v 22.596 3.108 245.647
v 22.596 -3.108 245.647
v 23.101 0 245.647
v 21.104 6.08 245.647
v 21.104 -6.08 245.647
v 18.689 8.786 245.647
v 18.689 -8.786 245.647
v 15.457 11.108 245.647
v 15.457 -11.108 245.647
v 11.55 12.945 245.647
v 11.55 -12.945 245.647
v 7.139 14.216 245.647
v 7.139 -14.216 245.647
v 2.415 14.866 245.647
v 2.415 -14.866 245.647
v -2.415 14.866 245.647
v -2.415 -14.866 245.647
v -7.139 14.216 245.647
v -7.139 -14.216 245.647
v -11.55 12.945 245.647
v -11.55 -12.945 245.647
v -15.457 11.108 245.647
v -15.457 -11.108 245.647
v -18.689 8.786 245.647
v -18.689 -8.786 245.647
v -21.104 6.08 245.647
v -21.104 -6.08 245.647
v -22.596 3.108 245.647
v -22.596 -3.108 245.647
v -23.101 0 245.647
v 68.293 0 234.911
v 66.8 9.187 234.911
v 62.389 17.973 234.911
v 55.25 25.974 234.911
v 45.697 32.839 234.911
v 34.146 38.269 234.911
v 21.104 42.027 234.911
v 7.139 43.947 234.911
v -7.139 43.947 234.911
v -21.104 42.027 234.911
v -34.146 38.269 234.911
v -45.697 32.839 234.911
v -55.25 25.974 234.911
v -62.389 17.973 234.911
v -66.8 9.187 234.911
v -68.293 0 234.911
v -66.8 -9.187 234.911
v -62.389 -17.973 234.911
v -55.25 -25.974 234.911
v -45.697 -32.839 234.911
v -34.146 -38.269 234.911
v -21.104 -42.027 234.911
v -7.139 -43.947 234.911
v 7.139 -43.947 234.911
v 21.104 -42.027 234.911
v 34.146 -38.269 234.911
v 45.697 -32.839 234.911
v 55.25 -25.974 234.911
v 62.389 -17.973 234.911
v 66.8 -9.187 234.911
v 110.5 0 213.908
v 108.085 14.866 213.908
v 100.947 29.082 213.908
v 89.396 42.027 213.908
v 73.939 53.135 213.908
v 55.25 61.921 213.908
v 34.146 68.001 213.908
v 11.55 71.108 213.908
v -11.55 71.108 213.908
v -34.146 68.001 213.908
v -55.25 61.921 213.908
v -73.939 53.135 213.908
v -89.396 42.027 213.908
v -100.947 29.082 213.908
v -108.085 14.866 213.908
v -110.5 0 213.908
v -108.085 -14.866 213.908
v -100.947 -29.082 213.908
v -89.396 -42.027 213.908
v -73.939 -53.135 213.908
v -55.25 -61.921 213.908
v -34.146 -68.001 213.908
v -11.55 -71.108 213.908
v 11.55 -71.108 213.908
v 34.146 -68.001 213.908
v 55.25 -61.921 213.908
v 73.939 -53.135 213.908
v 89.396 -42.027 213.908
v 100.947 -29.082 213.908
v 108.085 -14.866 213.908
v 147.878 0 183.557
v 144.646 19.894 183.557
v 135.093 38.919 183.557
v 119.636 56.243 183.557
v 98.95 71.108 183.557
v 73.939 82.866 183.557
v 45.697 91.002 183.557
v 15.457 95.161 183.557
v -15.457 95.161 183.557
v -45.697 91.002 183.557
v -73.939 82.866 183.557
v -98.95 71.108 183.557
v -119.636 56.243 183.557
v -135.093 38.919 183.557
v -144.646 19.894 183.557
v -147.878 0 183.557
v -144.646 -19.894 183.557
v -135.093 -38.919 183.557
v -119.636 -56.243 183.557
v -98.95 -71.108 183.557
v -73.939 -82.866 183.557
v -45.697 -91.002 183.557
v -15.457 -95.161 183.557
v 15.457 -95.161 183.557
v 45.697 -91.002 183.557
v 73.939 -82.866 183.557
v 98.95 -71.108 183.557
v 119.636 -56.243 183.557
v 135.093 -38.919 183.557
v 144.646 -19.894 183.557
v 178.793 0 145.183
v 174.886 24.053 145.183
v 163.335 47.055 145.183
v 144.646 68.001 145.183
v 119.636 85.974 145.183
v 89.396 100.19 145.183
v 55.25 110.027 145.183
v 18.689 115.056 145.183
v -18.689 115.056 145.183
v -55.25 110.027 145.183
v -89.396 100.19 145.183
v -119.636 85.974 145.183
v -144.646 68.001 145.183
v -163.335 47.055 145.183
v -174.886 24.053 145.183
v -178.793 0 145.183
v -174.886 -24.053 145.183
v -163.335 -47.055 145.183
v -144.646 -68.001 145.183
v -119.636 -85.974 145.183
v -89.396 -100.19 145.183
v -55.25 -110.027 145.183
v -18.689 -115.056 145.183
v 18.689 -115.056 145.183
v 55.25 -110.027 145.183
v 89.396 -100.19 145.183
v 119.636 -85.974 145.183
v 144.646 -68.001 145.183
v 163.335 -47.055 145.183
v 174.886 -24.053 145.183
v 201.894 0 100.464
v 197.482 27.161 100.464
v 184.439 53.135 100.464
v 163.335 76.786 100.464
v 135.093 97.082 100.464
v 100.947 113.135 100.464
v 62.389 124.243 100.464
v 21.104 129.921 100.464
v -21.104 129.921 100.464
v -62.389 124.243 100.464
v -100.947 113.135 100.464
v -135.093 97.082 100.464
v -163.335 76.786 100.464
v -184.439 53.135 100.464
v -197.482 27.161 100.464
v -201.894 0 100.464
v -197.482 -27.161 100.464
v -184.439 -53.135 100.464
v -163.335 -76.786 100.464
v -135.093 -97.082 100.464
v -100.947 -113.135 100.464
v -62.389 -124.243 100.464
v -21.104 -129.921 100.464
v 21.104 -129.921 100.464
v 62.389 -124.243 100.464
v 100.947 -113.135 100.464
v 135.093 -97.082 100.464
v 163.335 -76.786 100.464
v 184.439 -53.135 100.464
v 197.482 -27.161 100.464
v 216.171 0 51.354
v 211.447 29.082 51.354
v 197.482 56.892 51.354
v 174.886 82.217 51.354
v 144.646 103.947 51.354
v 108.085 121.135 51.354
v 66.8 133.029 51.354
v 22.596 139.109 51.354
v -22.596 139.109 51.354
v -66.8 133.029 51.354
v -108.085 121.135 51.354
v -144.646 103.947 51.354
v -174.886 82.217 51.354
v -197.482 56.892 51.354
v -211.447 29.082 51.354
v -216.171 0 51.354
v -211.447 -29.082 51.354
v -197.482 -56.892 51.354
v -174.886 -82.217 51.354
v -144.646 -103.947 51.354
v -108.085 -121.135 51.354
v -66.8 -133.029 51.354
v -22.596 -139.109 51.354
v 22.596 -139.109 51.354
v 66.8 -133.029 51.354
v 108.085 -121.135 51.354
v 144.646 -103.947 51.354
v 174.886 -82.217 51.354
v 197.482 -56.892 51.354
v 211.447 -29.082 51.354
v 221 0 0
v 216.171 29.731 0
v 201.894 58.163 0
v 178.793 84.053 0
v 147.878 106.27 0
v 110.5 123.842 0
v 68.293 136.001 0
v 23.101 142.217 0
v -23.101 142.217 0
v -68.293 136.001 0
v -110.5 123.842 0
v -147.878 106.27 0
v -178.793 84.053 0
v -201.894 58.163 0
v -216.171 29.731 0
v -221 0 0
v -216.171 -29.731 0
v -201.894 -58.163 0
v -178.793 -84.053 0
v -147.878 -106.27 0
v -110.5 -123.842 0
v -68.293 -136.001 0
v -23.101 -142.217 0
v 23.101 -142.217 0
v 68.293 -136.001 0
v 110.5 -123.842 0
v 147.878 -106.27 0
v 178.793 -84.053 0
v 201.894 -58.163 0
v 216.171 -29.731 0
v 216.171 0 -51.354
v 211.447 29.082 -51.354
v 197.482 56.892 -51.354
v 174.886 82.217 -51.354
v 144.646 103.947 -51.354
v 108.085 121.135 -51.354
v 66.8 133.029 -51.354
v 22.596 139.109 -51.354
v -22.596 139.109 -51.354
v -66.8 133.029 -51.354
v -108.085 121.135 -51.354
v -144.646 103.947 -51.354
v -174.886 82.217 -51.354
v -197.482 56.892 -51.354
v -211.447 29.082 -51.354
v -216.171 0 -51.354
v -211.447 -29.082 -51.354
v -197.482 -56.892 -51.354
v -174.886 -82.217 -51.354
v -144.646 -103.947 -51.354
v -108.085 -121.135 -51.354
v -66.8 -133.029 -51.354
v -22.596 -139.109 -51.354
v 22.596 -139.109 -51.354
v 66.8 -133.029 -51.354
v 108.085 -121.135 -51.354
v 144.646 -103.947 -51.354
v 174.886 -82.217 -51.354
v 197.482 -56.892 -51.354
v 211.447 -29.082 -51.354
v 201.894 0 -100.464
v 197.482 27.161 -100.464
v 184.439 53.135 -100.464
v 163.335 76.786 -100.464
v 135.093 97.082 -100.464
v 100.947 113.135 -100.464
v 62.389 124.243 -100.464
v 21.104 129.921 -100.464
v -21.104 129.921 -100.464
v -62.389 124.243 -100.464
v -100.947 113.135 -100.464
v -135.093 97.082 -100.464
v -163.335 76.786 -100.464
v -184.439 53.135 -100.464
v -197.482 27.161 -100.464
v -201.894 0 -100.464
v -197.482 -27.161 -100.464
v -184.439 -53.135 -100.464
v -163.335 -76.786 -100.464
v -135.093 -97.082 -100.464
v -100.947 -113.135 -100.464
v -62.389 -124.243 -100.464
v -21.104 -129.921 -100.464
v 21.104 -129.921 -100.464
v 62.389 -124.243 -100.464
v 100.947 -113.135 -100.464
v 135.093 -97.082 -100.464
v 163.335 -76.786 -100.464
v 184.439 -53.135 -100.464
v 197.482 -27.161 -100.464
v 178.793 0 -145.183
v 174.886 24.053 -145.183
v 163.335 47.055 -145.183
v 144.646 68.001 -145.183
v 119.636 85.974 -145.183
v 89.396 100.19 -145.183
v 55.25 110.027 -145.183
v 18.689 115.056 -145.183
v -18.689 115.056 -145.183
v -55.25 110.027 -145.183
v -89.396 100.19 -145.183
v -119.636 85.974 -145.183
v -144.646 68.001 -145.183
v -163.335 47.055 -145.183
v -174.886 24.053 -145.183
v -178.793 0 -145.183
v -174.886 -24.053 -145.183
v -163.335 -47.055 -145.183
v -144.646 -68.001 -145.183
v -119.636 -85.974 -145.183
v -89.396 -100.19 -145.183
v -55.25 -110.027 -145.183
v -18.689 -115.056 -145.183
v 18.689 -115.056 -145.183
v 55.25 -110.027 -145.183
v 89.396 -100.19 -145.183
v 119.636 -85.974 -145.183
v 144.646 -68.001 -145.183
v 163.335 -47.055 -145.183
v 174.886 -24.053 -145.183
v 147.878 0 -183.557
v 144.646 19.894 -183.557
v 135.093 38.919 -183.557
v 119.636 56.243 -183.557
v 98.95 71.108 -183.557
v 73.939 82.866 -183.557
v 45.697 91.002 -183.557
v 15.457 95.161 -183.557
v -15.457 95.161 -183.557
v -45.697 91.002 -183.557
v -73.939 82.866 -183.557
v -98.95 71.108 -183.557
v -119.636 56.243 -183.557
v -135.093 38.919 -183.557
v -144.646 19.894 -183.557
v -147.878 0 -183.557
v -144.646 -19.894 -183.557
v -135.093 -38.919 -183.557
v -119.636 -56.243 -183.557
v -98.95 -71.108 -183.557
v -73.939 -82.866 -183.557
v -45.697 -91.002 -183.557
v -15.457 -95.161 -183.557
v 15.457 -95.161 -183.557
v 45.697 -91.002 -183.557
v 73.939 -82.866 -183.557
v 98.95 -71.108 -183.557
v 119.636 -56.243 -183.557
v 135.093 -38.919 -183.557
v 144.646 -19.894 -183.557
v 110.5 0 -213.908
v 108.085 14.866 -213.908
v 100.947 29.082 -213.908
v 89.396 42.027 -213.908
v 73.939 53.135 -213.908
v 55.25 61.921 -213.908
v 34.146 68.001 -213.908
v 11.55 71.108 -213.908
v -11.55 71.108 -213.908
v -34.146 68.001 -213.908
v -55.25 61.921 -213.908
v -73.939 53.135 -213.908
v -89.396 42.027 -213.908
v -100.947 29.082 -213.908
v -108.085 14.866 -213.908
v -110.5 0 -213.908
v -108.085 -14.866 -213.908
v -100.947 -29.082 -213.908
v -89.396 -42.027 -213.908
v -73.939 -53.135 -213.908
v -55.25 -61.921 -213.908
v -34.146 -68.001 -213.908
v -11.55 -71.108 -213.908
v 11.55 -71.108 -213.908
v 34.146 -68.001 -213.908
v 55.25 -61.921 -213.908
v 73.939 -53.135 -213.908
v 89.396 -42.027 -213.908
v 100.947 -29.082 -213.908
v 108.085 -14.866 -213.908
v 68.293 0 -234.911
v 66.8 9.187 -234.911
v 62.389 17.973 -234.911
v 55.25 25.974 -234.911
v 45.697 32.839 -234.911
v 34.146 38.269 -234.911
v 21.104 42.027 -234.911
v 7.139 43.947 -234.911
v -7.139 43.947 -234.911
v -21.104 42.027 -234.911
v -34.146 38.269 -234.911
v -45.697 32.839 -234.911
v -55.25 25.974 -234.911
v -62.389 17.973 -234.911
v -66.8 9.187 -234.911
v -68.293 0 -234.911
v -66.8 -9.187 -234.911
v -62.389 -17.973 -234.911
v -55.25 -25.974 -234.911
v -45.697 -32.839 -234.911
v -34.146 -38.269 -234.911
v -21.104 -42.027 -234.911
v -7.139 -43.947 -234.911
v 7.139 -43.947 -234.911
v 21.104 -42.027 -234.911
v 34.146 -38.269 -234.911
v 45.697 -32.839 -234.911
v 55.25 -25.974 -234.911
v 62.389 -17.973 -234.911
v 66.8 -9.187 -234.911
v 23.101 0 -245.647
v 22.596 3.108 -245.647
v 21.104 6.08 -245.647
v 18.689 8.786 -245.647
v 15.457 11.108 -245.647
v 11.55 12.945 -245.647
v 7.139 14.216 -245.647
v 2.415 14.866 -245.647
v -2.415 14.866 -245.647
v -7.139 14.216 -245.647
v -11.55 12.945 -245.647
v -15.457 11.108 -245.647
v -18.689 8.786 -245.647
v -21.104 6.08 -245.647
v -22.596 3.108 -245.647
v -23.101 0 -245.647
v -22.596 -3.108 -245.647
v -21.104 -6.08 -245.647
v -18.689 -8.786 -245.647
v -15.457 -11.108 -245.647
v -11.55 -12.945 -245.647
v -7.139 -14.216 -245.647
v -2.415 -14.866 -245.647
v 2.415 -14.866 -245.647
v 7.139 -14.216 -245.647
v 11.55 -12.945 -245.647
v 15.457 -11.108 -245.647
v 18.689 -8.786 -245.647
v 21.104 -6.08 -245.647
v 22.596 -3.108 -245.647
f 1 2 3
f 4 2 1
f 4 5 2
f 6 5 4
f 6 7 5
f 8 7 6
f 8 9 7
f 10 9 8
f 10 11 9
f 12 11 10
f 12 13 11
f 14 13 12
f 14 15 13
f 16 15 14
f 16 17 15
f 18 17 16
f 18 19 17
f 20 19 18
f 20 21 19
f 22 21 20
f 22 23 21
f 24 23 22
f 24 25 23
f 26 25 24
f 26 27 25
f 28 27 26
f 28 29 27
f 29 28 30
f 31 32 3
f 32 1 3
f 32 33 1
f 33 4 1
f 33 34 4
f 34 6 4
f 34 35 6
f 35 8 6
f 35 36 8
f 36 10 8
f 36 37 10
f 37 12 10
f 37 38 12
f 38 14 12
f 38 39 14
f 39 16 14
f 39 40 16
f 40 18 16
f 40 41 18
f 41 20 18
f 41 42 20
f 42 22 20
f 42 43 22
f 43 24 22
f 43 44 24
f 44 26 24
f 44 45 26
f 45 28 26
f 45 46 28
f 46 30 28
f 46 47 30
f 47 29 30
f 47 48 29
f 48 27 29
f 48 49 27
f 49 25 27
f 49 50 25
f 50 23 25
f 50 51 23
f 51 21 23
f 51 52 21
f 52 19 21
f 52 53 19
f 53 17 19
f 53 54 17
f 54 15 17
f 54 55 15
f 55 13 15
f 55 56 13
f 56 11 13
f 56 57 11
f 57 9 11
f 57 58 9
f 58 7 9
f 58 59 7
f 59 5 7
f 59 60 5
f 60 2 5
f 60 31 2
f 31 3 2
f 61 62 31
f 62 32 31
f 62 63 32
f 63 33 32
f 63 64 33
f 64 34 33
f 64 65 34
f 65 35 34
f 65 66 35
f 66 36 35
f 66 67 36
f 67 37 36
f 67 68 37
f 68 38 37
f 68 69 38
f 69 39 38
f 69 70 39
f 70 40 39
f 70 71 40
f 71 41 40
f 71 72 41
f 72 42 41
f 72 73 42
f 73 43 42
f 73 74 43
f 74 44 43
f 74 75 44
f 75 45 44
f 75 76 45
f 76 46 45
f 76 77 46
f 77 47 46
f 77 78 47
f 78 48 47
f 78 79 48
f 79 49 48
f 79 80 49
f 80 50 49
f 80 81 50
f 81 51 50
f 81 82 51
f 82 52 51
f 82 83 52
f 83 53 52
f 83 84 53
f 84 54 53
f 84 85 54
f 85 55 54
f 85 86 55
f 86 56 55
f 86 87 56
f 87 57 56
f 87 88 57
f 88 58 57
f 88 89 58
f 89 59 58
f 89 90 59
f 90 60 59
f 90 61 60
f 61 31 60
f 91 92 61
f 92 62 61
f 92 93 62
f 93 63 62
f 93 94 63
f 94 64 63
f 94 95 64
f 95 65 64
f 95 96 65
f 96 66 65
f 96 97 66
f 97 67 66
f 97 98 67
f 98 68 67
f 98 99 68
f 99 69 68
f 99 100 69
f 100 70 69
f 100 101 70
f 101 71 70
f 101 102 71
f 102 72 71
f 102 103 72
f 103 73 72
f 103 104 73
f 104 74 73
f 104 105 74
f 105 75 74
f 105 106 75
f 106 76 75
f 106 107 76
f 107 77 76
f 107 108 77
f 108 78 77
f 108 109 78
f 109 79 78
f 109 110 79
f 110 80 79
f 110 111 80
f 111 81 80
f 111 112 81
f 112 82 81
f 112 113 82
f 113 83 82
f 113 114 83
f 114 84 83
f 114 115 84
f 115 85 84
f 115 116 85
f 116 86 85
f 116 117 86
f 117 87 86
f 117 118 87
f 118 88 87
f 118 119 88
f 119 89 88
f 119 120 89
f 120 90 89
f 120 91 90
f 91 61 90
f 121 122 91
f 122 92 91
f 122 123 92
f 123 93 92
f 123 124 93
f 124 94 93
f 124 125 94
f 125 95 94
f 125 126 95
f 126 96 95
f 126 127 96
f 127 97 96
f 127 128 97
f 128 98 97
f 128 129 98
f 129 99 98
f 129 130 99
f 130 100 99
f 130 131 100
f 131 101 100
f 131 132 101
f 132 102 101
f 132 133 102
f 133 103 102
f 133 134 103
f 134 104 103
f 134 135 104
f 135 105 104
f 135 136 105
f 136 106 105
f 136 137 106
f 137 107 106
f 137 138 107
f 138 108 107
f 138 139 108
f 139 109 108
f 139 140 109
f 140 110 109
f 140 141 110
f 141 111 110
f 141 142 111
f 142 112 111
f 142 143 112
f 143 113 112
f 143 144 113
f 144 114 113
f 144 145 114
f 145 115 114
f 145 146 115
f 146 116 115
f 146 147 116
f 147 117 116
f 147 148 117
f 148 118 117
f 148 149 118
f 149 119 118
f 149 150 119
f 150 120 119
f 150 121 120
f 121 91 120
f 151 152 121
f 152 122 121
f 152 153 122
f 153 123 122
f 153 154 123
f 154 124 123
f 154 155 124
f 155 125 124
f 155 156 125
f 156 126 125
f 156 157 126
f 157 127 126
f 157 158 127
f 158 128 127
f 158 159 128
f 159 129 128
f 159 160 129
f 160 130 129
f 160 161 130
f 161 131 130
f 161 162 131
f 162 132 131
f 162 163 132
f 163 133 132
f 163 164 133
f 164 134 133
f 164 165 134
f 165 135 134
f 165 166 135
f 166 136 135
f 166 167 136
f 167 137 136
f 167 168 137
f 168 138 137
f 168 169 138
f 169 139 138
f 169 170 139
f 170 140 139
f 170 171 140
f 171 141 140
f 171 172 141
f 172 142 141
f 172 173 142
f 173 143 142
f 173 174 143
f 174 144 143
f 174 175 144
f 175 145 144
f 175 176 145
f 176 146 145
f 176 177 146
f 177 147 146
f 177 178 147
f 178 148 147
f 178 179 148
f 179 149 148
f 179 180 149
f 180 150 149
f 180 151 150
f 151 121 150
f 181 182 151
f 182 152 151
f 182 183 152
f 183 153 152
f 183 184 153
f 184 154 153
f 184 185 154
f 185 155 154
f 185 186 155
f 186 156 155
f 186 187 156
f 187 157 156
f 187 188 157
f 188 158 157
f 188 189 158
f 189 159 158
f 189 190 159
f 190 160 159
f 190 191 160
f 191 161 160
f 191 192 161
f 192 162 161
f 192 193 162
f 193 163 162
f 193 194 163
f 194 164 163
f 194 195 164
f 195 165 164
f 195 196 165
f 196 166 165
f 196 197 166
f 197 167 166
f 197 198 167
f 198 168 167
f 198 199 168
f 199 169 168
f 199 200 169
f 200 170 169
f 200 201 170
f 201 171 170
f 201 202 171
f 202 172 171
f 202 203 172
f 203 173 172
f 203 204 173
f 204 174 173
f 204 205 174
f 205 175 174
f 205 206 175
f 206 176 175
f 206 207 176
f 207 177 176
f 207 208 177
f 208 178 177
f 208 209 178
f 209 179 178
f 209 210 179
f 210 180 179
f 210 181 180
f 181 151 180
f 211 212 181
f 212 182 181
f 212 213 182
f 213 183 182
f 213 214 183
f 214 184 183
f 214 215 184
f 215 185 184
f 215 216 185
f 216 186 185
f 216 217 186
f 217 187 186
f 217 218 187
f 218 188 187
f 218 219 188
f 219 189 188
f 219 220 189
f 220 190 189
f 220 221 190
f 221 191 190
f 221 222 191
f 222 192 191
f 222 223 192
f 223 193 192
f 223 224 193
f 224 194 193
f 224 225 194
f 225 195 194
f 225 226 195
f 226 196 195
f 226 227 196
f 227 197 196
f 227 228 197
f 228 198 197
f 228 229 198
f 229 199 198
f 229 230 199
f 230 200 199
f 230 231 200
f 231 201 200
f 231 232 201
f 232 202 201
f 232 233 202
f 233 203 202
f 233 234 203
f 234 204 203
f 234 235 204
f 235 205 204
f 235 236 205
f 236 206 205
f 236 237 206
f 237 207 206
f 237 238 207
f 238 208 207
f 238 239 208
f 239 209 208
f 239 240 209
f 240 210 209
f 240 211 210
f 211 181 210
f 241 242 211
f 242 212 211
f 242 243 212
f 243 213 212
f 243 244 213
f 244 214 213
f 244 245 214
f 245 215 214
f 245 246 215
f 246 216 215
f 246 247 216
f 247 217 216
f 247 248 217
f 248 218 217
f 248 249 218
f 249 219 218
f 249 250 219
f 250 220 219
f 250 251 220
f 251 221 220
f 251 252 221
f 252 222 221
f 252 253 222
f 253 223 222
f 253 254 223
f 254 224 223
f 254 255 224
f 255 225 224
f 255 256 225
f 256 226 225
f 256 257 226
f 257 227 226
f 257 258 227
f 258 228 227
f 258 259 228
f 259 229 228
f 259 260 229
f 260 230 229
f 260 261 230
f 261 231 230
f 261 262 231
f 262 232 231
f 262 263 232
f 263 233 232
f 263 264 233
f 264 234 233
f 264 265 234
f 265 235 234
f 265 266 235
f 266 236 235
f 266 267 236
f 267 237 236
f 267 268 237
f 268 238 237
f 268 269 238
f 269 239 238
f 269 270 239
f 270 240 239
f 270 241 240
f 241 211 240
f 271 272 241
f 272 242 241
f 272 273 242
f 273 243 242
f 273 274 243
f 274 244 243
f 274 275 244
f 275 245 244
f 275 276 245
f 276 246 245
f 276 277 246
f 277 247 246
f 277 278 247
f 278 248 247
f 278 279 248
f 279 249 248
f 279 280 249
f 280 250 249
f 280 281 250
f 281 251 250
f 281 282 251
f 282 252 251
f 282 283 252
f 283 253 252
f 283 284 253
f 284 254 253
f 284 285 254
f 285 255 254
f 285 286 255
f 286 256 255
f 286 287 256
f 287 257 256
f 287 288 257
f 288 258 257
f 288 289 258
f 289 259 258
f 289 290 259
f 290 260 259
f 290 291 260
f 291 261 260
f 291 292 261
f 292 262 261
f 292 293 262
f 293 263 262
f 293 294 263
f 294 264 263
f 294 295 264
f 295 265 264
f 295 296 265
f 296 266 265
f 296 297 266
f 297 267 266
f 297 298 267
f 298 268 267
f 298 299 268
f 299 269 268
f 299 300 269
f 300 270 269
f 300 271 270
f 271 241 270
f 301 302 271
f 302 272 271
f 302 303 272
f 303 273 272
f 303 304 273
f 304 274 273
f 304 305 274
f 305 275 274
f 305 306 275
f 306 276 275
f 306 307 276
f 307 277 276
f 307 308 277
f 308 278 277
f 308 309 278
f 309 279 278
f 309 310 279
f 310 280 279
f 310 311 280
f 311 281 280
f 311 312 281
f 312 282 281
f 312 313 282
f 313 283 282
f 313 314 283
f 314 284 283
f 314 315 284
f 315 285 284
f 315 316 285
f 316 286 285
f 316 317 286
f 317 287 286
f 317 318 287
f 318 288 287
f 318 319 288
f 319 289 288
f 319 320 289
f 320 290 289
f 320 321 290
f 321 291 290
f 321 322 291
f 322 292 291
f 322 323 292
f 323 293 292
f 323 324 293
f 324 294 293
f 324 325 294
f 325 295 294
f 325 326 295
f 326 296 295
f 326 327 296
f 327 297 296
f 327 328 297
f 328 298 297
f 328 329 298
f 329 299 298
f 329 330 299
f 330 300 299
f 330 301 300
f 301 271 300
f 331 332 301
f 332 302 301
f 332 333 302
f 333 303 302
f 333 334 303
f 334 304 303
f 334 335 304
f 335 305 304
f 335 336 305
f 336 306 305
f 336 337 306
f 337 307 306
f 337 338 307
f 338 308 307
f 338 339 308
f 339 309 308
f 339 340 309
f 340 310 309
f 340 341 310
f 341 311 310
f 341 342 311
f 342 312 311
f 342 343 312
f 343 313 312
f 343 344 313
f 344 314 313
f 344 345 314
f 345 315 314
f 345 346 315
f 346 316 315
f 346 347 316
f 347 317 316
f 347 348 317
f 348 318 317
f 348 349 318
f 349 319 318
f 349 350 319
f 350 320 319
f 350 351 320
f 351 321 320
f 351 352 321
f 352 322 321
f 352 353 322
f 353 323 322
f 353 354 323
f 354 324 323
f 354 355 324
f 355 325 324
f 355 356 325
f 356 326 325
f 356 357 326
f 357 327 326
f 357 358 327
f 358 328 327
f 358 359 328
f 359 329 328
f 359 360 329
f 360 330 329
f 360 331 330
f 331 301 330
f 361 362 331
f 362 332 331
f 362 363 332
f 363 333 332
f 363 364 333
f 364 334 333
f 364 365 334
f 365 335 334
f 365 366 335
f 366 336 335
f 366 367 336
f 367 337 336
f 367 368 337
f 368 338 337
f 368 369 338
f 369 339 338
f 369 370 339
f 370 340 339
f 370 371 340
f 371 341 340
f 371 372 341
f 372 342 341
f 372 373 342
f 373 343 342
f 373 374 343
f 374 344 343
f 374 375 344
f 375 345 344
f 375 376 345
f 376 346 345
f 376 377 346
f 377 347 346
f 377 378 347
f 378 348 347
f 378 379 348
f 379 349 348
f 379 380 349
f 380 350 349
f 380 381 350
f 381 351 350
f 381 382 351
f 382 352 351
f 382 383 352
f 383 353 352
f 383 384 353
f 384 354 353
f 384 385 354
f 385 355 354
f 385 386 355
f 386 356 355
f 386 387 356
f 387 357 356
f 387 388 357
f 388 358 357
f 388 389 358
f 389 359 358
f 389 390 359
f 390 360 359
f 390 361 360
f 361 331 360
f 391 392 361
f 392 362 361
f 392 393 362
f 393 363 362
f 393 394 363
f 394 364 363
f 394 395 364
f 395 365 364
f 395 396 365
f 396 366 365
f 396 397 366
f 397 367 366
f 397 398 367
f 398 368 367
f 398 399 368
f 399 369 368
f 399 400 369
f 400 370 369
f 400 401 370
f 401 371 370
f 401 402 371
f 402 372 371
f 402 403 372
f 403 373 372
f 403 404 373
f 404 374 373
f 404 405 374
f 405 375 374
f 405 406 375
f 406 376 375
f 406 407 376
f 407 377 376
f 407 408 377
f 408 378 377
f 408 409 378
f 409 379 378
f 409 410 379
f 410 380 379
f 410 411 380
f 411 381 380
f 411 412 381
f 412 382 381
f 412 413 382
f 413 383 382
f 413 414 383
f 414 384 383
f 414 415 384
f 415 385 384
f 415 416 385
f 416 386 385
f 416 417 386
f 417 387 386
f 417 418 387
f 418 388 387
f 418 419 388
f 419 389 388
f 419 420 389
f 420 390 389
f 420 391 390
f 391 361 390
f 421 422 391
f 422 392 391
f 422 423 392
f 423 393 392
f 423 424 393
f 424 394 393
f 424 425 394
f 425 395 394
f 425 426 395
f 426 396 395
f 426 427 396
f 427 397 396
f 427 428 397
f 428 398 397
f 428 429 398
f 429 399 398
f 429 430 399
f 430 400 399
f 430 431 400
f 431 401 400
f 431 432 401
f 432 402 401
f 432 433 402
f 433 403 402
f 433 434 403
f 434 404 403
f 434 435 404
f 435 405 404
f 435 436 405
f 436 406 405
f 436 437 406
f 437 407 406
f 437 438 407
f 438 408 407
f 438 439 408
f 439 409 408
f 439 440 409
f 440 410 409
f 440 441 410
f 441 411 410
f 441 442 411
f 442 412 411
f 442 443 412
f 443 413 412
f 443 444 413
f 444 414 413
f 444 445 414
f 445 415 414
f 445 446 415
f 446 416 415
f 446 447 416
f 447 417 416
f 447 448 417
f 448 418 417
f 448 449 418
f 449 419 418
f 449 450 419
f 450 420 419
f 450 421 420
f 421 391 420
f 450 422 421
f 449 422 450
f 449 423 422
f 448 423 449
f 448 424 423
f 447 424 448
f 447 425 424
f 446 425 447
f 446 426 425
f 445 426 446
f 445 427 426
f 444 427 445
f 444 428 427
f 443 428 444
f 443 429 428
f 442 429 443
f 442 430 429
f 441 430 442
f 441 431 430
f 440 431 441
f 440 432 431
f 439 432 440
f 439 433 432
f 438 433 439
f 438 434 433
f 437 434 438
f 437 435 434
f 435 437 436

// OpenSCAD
// Generated by SolidPython 1.0.1 on 2020-07-29 00:46:53


scale(v = [17, 11, 19]) {
	sphere(r = 13);
}
/***********************************************
*********      SolidPython code:      **********
************************************************
 
# import packages: SolidPython
from solid import *
from solid.utils import *
from itertools import chain, combinations, permutations


class Resize:

    def __init__(self, scad_file):
        self.scad_file = scad_file
        #self.scad_file = import_scad(scad_file)
        # cone/cylinder param:
        self.r1 = 0
        self.r2 = 0
        self.h = 0
        # rectangular prism param:
        self.w = 0
        self.l = 0
        # ellipse param:
        self.r = 0

    # import OpenScad code (file name corresponds to shape)


    # classify shape + parameters
    def assign(self, param1, param2, param3):
        if self.scad_file == 'cone.scad':
            self.r1 = param1
            self.r2 = param2
            self.h = param3
        elif self.scad_file == 'cylinder.scad':
            self.r1 = param1
            self.r2 = param2
            self.h = param3
        elif self.scad_file == 'rectangularPrism.scad':
            self.h = param1
            self.l = param2
            self.w = param3
        else:
            self.r = param1
            self.h = param2

    # resize parameters
    def iterate(self):
        x = range(3, 20, 2)
        i = 1
        if self.scad_file == 'cone.scad':
            tempList = list(permutations(x, 2))
            for temp in tempList:
                param1 = temp[0]
                param2 = temp[1]
                filepath = 'produced_scad_files/' + 'cone' + str(param1) + '_' + str(param2) + '_' + '.scad'
                scad_render_to_file(cylinder(h=param1, r1=param2, r2=0), filepath)

        elif self.scad_file == 'cylinder.scad':
            tempList = list(permutations(x, 3))
            for temp in tempList:
                param1 = temp[0]
                param2 = temp[1]
                filepath = 'produced_scad_files/' + 'cylinder' + str(param1) + '_' + str(param2) + '_' + '.scad'
                scad_render_to_file(cylinder(h=param1, r1=param2, r2=param2), filepath)

        elif self.scad_file == 'rectangularPrism.scad':
            tempList = list(permutations(x, 3))
            for temp in tempList:
                param1 = temp[0]
                param2 = temp[1]
                param3 = temp[2]
                filepath = 'produced_scad_files/' + 'rectangularPrism' + str(param1) + '_' + str(param2) + '_' + str(
                    param3) + '.scad'
                scad_render_to_file(cube(size=(param1, param2, param3)), filepath)

        elif self.scad_file == 'ellipse.scad':
            tempList = list(permutations(x, 4))
            for temp in tempList:
                param1 = temp[0]
                param2 = temp[1]
                param3 = temp[2]
                param4 = temp[3]
                filepath = 'produced_scad_files/' + 'ellipse' + str(param1) + '_' + str(param2) + '_' + str(param3) + '_' + str(param4) + '.scad'
                scad_render_to_file(scale([param1, param2, param3])(sphere(r=param4)), filepath)

    def render_to_scadfile(self):
        scad_render_to_file(scad, 'example.scad') 
 
************************************************/
